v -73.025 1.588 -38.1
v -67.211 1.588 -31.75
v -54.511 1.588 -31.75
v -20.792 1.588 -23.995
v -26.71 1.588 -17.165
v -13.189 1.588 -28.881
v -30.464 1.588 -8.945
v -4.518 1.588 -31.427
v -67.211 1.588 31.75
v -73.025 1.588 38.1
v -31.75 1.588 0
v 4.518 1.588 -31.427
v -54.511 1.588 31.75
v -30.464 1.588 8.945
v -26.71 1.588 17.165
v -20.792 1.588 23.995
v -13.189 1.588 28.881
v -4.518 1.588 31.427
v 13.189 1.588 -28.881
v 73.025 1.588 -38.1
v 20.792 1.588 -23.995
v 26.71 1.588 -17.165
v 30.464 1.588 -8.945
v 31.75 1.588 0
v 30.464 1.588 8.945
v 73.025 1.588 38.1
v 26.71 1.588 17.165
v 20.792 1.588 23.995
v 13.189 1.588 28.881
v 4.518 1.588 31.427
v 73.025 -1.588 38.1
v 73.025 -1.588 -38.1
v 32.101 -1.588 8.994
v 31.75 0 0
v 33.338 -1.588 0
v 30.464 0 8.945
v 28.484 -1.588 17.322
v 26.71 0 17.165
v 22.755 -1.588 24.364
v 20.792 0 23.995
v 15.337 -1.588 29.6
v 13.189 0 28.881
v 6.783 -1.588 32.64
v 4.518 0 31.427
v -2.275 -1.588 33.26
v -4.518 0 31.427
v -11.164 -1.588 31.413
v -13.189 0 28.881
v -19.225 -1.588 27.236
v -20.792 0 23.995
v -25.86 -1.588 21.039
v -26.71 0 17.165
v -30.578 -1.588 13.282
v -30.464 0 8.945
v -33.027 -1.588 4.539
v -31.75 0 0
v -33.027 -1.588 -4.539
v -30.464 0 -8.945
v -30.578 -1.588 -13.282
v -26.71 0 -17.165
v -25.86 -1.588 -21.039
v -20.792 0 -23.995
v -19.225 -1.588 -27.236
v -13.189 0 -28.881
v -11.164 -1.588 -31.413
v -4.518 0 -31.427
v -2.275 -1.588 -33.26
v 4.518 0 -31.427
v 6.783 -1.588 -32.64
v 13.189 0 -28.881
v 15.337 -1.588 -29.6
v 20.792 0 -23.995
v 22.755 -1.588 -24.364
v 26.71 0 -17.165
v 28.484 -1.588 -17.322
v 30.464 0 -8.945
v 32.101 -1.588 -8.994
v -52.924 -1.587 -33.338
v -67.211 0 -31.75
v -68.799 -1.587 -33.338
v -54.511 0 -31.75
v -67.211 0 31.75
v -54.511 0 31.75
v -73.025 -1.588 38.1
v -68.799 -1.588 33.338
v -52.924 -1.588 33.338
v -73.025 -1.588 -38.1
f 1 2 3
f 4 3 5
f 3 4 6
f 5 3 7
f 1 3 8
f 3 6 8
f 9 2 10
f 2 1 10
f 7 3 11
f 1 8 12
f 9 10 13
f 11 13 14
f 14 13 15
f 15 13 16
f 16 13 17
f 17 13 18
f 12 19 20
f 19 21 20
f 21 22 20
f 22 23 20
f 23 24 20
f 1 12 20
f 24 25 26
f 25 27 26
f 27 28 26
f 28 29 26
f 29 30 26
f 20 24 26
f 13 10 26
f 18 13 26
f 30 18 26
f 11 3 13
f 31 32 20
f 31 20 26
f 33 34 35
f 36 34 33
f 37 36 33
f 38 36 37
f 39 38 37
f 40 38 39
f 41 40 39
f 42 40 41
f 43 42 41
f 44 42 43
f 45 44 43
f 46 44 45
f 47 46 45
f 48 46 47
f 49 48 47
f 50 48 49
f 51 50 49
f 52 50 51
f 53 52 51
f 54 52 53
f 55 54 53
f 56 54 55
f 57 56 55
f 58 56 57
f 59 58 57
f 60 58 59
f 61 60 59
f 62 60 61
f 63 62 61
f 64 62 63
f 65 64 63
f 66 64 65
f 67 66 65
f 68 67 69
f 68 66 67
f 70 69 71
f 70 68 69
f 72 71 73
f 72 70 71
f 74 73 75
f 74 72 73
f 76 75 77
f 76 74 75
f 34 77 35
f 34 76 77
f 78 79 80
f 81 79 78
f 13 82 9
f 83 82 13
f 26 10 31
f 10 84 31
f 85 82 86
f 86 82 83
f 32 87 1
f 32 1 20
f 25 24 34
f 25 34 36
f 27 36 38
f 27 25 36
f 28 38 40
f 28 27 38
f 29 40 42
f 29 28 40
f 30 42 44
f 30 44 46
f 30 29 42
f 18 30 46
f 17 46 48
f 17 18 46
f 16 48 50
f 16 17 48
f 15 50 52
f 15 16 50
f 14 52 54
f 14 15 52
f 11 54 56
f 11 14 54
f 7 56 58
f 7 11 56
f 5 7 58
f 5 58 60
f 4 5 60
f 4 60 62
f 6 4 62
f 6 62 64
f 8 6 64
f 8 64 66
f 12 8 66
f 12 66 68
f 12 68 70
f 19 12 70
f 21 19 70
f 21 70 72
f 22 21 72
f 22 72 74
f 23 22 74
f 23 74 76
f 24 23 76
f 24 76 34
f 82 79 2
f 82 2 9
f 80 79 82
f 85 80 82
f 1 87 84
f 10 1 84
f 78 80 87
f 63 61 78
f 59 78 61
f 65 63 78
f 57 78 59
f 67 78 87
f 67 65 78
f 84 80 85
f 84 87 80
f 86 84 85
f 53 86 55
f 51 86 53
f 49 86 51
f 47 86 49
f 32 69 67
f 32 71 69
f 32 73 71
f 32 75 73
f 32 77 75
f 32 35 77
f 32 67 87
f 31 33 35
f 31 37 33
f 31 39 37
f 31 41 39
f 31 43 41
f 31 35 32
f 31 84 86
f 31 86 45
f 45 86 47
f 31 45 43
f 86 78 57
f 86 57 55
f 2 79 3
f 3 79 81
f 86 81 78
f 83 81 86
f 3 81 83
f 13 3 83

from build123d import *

# Parameters (mm, degrees)
F0_W     = 146.05
F0_H     = 76.2
F0_W_2   = 12.7
F0_H_2   = 63.5
F0_R     = 31.75
F1_DEPTH = 1.5875
F2_SIZE  = 1.5875
F3_SIZE  = 1.5875


with BuildPart() as f1:
    # F0 (on Front) → F1 (new body, symmetric)
    with BuildSketch(Plane.XZ):
        Rectangle(F0_W, F0_H)
        with Locations((-60.861046, 0)):
            Rectangle(F0_W_2, F0_H_2, mode=Mode.SUBTRACT)
        Circle(F0_R, mode=Mode.SUBTRACT)
    extrude(amount=F1_DEPTH, both=True)

    # F2
    f2_edges = [f1.edges().sort_by_distance(p)[0] for p in [
        (-54.511046, -1.5875, 0),
        (-60.861046, -1.5875, -31.75),
        (-67.211046, -1.5875, 0),
        (-60.861046, -1.5875, 31.75),
    ]]
    chamfer(f2_edges, length=F2_SIZE)

    # F3
    f3_edges = [f1.edges().sort_by_distance(p)[0] for p in [
        (-31.75, -1.5875, 0),
    ]]
    chamfer(f3_edges, length=F3_SIZE)


solid = f1.part
